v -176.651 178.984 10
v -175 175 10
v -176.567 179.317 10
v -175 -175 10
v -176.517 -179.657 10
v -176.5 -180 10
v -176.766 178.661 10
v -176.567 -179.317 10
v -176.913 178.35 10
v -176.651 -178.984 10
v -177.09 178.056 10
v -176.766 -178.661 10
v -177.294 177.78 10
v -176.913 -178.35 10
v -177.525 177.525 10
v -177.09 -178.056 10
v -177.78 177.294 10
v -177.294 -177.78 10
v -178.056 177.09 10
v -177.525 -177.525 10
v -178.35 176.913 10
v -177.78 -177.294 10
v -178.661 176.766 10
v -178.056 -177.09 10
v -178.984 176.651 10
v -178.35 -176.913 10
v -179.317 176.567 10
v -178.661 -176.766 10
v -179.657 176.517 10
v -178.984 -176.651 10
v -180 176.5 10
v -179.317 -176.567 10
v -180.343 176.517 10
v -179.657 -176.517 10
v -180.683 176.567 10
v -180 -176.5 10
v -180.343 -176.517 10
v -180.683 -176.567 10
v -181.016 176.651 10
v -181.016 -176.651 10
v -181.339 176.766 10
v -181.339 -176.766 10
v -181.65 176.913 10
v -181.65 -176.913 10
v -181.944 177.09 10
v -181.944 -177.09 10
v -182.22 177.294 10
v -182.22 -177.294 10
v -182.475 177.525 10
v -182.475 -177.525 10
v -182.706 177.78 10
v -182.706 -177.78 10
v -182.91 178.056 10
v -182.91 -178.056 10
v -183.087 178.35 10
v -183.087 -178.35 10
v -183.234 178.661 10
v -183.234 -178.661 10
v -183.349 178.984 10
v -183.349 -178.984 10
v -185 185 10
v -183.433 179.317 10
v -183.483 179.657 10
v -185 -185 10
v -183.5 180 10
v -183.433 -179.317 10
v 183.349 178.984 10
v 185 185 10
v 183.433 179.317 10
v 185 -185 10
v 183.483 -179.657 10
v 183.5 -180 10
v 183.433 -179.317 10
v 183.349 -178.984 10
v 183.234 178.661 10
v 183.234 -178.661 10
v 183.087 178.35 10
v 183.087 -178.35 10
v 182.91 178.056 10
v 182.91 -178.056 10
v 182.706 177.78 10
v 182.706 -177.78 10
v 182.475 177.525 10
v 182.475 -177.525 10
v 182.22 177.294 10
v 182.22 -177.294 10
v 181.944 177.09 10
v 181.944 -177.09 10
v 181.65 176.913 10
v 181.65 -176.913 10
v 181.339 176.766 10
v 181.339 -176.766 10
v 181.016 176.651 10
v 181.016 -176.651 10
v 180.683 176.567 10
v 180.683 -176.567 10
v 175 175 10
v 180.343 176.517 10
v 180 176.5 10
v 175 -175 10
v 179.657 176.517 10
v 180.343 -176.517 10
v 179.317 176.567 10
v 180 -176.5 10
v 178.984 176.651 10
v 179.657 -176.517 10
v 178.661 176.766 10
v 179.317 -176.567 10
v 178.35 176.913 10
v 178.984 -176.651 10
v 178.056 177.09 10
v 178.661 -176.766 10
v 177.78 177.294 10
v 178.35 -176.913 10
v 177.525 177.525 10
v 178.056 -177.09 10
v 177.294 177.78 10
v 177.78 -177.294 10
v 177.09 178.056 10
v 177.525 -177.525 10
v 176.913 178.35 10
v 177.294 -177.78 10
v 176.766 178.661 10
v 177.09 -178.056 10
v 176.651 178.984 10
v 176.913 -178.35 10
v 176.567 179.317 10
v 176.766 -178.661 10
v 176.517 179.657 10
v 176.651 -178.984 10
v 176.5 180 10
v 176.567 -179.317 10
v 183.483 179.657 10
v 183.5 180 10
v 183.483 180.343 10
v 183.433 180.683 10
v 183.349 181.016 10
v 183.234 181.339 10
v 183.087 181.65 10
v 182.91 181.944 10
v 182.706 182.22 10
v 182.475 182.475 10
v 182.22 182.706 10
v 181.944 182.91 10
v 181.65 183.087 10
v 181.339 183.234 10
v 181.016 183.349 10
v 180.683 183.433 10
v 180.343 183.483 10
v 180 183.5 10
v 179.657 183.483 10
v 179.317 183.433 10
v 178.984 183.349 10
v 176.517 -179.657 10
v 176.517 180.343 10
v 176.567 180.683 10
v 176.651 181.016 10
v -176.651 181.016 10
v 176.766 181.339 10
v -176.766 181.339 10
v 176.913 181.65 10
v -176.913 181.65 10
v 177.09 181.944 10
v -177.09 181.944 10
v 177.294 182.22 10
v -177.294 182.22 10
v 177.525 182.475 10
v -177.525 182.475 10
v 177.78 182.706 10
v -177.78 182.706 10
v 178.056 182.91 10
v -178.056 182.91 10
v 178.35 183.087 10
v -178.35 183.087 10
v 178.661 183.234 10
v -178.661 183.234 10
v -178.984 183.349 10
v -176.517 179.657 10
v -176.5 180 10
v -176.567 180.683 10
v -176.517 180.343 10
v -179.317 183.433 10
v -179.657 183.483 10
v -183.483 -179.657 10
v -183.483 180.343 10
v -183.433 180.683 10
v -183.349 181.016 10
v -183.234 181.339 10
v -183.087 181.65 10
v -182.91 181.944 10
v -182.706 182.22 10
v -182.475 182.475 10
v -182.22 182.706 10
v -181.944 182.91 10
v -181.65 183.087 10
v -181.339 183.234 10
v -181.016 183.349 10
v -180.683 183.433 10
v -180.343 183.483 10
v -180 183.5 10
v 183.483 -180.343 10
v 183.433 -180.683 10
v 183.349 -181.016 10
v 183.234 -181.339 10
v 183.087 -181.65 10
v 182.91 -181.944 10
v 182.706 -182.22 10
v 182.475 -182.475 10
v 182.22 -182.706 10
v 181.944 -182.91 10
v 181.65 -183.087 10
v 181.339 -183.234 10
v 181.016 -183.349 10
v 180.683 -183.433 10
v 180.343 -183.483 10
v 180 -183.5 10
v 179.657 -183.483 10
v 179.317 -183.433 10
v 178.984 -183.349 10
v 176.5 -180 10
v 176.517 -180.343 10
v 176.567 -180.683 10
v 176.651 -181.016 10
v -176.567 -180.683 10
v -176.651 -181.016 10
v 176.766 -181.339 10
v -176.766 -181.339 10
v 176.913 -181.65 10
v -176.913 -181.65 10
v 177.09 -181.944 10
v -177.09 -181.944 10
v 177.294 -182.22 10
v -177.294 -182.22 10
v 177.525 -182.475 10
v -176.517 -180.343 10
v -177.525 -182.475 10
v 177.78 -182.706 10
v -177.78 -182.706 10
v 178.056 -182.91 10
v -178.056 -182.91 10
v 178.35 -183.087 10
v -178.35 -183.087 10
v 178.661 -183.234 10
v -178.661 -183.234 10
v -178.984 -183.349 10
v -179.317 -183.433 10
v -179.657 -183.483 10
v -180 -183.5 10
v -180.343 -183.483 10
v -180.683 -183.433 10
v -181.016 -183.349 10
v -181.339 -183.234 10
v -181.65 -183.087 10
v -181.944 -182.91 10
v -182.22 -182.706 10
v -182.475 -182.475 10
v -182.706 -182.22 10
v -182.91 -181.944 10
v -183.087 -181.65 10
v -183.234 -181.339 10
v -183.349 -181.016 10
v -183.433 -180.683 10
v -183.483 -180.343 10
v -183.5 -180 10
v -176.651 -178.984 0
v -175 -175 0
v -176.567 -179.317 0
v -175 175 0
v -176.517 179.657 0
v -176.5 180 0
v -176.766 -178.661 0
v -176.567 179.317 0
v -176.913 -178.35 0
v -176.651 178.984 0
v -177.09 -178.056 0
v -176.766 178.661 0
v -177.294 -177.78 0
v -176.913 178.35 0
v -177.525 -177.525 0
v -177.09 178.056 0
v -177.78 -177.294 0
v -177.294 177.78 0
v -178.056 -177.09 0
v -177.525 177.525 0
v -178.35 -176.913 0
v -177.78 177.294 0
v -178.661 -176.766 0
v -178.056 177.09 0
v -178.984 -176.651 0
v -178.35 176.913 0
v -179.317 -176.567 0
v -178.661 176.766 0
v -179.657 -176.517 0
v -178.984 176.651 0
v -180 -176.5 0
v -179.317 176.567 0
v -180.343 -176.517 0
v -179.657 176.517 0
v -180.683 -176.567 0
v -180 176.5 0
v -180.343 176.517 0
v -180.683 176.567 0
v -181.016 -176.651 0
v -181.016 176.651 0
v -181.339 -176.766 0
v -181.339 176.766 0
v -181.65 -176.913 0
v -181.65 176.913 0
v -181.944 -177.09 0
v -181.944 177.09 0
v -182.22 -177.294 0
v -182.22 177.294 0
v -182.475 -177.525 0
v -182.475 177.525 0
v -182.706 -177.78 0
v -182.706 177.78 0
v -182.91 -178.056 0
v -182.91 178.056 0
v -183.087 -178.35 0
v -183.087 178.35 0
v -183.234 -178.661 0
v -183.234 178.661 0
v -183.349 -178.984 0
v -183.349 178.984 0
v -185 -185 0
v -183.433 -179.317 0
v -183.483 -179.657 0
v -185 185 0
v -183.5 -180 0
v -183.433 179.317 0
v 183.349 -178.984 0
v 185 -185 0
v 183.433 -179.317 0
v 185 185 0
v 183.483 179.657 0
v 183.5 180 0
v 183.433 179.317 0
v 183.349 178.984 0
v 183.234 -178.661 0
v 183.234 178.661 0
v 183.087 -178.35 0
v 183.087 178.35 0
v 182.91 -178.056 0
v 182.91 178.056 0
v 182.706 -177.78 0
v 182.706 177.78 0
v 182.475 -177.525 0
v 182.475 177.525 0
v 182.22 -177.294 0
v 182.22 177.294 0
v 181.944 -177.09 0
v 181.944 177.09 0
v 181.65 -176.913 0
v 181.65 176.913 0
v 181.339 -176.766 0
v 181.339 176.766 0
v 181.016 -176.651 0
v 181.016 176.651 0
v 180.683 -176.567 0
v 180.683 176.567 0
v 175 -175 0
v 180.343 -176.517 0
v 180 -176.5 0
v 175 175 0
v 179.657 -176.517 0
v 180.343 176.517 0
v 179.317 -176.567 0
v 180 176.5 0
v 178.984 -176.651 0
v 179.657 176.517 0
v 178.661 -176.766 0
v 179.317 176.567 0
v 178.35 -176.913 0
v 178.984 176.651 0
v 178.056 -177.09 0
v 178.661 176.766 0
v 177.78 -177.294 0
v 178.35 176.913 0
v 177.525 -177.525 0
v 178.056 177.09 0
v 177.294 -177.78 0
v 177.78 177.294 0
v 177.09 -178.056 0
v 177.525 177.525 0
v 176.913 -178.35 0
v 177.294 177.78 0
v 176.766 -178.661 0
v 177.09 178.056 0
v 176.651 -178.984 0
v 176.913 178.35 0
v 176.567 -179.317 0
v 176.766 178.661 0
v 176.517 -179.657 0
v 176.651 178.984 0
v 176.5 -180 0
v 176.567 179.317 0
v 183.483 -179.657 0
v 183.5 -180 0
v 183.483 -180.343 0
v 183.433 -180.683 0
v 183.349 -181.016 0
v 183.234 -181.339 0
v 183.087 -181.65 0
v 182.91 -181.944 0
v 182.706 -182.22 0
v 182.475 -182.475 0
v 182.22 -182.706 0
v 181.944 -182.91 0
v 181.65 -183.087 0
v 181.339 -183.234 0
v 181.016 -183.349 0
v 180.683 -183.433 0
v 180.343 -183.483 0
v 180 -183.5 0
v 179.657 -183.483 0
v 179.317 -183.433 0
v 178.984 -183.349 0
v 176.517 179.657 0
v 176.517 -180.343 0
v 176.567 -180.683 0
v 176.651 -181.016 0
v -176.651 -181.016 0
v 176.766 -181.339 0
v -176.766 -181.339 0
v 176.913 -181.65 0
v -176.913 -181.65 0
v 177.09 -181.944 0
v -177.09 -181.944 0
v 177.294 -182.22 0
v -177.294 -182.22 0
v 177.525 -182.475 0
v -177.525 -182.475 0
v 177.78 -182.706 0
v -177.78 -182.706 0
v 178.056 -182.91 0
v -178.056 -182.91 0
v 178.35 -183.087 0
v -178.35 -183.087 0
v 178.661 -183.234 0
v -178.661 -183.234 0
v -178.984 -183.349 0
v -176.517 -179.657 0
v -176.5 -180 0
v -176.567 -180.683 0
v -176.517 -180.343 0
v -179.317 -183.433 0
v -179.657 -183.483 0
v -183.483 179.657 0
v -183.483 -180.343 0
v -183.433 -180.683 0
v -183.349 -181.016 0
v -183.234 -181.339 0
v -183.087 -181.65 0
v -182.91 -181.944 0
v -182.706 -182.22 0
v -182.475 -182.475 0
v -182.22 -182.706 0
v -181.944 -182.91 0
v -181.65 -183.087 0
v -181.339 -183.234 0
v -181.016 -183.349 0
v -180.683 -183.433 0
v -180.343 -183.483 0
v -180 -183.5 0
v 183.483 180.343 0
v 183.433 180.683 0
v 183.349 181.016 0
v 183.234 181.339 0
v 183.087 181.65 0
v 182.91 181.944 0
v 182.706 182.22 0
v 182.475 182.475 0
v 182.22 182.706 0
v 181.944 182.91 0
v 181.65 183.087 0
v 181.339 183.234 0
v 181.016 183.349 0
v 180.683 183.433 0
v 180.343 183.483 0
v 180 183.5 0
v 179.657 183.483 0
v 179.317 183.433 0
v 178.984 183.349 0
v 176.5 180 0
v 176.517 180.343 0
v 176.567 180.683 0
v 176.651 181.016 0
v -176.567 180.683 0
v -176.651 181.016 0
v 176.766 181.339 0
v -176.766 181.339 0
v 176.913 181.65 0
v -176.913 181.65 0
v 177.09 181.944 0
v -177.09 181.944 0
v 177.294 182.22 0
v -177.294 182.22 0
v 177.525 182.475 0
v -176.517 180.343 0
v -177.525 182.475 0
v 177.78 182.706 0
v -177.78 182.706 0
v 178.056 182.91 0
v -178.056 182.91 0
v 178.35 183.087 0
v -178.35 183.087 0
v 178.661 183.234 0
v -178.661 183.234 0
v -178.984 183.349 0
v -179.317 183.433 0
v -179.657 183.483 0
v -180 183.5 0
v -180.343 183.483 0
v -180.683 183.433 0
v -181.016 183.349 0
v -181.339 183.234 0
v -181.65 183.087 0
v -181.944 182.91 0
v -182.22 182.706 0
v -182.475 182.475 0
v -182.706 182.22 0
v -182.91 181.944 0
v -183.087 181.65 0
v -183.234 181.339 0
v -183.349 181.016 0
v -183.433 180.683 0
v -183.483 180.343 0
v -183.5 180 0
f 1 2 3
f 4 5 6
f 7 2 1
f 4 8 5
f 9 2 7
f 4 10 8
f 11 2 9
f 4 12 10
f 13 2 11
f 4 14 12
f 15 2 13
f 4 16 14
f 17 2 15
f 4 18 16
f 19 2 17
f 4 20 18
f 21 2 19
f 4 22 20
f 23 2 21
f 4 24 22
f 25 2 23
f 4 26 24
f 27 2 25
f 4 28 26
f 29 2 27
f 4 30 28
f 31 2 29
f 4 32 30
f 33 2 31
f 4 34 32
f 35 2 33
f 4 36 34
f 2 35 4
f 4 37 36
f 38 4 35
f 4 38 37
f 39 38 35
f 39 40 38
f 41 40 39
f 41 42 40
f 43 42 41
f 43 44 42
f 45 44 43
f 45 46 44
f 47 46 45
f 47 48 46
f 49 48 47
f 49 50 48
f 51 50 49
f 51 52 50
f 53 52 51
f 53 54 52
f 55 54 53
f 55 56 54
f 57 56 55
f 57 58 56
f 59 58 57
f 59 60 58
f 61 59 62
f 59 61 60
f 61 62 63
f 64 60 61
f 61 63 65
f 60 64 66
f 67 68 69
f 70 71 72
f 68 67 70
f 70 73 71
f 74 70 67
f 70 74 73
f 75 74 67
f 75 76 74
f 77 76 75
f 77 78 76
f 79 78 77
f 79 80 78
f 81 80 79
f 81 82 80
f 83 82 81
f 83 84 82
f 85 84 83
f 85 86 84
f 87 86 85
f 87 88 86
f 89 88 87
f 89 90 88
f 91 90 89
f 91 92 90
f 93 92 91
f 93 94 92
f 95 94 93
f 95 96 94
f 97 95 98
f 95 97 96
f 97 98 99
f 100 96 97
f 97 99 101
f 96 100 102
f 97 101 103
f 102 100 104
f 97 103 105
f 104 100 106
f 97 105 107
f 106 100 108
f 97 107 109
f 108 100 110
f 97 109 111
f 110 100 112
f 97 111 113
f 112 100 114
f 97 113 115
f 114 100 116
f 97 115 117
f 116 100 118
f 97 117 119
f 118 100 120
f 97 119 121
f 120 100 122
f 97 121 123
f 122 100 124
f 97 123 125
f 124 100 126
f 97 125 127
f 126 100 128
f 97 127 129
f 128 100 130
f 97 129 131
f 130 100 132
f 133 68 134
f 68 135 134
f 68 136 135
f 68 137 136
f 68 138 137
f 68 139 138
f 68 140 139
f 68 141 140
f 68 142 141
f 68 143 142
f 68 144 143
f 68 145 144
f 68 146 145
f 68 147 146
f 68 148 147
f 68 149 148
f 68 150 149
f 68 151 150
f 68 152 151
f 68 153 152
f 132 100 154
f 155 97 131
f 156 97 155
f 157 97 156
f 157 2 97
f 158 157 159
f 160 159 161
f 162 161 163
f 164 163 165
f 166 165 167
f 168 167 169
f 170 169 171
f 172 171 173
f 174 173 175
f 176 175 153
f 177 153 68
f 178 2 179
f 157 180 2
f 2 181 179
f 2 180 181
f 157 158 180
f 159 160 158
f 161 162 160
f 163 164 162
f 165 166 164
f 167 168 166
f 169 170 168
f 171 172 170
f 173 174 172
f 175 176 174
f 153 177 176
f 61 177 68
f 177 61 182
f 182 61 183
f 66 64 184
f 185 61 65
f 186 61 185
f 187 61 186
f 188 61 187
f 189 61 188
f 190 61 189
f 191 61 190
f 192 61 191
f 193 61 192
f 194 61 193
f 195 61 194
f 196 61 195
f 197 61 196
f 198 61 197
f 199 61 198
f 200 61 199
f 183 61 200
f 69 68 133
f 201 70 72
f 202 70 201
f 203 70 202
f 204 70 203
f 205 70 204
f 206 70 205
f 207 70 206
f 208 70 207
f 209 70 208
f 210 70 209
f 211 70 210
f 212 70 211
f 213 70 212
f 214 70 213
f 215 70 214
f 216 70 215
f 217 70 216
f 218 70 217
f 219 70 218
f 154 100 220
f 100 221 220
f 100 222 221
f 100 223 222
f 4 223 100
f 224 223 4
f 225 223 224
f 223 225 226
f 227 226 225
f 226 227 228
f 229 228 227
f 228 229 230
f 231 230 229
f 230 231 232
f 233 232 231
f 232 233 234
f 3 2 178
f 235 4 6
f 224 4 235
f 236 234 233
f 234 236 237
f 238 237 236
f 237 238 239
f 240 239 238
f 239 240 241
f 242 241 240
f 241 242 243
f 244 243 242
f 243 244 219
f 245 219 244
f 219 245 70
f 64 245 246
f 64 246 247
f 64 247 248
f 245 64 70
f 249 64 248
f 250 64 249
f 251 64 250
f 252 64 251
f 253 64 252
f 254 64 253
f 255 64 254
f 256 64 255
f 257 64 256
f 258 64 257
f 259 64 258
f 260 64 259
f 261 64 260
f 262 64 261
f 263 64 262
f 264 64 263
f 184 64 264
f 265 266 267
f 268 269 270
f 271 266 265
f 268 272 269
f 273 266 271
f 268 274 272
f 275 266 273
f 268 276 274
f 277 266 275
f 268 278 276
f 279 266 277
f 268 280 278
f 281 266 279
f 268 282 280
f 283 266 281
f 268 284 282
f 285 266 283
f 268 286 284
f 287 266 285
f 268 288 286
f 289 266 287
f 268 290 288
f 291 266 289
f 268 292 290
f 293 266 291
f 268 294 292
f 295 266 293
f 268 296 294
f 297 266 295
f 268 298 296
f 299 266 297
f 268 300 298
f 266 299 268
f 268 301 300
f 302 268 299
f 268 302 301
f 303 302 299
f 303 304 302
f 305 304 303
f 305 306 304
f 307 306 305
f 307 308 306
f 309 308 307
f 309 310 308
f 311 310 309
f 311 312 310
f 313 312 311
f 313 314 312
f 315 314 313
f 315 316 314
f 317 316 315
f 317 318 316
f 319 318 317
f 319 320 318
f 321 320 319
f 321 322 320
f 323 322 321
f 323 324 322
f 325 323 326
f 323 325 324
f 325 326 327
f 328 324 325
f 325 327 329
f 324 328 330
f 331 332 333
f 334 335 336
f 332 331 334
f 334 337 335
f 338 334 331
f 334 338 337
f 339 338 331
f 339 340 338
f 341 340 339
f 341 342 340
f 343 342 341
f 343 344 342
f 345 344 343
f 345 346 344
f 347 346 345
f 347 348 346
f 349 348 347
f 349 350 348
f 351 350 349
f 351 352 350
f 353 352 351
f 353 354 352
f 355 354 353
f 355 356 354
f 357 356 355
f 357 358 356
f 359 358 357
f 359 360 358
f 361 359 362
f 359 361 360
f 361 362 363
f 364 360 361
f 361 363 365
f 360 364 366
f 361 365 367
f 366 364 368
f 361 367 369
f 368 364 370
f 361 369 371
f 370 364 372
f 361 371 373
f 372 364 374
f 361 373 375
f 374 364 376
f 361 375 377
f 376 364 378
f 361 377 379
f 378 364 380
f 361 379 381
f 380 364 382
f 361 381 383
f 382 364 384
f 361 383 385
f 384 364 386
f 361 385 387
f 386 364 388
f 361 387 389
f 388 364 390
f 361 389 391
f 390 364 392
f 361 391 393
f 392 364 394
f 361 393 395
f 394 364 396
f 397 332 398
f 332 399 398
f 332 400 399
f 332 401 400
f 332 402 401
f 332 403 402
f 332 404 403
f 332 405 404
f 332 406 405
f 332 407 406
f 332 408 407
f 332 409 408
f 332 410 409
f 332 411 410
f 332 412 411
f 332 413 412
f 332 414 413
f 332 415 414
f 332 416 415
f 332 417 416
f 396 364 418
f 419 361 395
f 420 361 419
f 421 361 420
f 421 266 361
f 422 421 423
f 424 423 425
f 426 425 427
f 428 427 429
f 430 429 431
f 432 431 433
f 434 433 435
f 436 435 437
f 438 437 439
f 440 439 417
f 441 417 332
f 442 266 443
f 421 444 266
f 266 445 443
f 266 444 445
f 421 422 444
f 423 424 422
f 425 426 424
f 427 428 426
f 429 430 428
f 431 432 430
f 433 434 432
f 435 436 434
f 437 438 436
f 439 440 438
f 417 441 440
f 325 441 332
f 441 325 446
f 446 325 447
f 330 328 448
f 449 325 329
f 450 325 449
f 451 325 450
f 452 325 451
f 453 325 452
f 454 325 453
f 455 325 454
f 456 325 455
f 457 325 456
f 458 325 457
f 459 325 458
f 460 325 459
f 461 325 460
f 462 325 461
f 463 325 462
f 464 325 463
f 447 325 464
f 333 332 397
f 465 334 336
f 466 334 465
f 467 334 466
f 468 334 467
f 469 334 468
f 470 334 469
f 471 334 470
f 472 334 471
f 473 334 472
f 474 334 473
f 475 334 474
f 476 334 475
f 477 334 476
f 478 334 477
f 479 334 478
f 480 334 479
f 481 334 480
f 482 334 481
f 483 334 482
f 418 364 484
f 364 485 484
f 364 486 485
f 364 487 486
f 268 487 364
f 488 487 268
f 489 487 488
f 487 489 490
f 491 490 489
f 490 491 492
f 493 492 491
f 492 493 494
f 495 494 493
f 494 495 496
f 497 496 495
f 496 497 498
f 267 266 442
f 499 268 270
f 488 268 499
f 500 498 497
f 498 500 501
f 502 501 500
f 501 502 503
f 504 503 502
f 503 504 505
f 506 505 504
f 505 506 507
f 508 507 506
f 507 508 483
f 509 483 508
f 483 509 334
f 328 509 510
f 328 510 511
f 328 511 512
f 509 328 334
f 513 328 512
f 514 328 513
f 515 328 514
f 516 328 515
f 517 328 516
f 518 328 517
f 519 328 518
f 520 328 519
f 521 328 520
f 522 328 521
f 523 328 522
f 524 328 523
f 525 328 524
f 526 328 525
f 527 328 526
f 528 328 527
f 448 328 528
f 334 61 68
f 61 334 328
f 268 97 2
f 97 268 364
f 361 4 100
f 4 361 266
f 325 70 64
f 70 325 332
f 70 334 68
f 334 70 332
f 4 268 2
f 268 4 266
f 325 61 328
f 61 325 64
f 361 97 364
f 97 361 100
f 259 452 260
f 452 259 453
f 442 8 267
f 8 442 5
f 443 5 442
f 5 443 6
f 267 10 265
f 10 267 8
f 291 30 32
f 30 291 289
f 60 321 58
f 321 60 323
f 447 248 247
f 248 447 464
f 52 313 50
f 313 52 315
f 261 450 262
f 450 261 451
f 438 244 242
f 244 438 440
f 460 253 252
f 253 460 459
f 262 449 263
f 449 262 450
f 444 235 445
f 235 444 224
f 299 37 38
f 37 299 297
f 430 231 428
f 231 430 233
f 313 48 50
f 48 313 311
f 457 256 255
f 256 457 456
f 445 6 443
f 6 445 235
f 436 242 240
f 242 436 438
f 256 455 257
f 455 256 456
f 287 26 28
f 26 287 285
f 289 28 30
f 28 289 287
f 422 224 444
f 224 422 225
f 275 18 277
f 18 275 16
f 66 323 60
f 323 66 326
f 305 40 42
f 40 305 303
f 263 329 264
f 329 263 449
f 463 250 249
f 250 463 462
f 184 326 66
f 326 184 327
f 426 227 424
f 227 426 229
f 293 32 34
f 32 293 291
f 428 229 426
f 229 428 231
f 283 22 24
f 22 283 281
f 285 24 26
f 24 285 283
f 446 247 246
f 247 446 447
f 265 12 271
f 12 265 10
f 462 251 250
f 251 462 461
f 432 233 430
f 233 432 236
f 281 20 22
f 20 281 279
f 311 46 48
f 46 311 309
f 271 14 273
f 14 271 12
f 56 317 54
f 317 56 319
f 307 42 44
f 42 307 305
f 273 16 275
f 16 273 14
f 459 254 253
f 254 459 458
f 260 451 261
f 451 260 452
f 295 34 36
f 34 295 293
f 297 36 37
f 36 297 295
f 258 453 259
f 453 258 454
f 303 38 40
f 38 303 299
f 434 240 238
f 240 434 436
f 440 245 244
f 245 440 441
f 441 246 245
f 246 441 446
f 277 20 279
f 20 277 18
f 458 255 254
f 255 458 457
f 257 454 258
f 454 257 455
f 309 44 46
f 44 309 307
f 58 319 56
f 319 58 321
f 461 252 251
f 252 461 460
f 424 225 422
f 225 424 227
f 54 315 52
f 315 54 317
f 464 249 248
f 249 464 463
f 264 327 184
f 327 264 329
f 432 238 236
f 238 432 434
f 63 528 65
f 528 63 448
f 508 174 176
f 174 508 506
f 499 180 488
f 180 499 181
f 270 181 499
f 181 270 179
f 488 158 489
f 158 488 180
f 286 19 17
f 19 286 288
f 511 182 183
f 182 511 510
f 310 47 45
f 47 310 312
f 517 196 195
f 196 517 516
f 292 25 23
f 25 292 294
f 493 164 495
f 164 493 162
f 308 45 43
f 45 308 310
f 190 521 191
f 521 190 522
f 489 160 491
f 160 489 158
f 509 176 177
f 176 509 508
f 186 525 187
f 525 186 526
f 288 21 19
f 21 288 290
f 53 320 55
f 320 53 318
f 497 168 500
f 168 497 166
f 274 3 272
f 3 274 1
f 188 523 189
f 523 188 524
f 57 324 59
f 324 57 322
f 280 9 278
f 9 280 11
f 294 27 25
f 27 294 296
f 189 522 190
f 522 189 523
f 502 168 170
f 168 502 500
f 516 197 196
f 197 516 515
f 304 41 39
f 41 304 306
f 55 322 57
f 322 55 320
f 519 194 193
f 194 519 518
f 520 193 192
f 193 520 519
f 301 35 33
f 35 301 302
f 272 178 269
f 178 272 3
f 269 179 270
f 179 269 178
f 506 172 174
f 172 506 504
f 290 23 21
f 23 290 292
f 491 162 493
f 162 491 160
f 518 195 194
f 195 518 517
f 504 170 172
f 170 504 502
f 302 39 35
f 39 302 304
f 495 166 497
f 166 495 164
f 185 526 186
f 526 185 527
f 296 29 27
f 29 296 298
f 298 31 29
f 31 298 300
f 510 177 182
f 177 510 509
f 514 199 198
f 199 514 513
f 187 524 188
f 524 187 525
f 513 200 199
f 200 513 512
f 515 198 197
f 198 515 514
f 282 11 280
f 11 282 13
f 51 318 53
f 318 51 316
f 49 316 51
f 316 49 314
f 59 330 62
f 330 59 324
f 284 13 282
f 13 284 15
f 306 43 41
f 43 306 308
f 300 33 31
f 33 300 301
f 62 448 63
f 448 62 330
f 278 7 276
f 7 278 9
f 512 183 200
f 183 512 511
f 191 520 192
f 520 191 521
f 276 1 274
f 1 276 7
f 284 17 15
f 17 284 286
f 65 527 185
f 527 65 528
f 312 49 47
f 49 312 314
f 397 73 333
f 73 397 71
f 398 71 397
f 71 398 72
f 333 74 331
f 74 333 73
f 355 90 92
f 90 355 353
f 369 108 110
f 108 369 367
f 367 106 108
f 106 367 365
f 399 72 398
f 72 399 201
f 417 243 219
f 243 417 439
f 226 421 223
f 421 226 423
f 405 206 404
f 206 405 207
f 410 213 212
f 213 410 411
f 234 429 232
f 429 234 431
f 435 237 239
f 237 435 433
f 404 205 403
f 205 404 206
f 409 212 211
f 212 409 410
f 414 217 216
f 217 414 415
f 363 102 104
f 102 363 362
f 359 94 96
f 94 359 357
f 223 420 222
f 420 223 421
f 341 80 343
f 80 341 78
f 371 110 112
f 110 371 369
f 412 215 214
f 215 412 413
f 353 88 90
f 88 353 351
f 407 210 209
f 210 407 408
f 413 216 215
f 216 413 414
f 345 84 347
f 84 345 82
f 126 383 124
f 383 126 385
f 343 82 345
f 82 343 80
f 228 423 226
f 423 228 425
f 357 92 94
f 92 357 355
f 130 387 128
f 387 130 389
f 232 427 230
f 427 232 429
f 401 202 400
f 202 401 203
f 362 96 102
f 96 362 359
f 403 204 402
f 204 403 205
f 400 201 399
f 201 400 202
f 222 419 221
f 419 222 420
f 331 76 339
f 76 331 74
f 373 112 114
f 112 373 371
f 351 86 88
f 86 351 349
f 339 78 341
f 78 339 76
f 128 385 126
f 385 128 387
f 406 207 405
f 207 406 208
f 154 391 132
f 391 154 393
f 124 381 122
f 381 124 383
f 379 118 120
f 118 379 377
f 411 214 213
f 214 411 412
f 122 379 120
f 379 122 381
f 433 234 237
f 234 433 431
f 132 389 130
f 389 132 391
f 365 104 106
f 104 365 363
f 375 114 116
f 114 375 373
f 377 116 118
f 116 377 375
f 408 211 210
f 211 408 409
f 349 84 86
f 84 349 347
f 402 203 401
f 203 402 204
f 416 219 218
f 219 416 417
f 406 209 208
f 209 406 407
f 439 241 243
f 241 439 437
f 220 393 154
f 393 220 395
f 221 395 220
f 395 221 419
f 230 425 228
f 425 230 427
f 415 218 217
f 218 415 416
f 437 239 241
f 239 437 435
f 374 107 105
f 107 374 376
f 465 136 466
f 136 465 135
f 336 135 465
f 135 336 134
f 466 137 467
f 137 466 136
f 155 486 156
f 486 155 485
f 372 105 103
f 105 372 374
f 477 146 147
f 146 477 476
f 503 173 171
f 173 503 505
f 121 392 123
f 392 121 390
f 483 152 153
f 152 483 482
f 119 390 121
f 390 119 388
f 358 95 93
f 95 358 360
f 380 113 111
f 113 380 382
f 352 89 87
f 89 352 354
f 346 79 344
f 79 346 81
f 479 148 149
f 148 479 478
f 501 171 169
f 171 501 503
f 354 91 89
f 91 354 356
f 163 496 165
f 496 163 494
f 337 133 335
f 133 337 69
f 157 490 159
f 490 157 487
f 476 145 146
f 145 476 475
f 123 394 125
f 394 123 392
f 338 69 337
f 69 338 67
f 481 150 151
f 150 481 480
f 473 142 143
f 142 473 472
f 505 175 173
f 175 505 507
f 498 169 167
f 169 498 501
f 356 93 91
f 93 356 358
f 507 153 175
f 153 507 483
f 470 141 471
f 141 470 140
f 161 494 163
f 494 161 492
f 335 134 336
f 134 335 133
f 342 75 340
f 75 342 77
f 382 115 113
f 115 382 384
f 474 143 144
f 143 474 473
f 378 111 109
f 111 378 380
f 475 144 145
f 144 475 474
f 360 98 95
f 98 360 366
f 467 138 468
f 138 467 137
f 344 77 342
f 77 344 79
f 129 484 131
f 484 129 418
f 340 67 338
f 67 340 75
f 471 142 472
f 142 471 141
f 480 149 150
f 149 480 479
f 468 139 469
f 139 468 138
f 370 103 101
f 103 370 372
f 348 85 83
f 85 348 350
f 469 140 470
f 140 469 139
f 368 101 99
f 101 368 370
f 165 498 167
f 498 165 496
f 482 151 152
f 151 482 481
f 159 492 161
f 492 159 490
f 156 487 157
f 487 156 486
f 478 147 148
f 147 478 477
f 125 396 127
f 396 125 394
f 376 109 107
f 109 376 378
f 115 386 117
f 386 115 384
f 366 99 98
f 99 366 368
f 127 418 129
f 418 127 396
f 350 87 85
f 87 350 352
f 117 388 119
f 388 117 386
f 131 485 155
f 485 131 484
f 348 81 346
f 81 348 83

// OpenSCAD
// ring_43.scad - ring index 43 (z bottom = 430 mm)
$fn = 64; bar = 10; half_b = bar/2; outer = 370; half_outer = outer/2;
front_y = 180; back_y = -180; left_x = -180; right_x = 180;
x_centers = [-170, -100, -30, 40, 110, 180];
z_centers = [5, 85, 155, 225, 295, 365, 435, 505, 575, 645, 715]; ring_z = 430;
module place_box(cx, cy, sx, sy) { translate([cx - sx/2, cy - sy/2, 0]) cube([sx, sy, bar]); }

difference() { union() {
    for (x = x_centers) { place_box(x, front_y, bar, bar); place_box(x, back_y, bar, bar); }
    for (y = x_centers) { place_box(left_x, y, bar, bar); place_box(right_x, y, bar, bar); }
    for (zc = z_centers) if ((zc - half_b < ring_z + bar) && (zc + half_b > ring_z)) {
        translate([-half_outer, front_y - half_b, 0]) cube([outer, bar, bar]);
        translate([-half_outer, back_y - half_b, 0])  cube([outer, bar, bar]);
        translate([left_x - half_b, -half_outer, 0])  cube([bar, outer, bar]);
        translate([right_x - half_b, -half_outer, 0]) cube([bar, outer, bar]);
    }
  }
  for (cx = [-180, 180]) for (cy = [-180, 180]) translate([cx, cy, 0]) cylinder(h = bar, r = 3.5, $fn = 64);
}
